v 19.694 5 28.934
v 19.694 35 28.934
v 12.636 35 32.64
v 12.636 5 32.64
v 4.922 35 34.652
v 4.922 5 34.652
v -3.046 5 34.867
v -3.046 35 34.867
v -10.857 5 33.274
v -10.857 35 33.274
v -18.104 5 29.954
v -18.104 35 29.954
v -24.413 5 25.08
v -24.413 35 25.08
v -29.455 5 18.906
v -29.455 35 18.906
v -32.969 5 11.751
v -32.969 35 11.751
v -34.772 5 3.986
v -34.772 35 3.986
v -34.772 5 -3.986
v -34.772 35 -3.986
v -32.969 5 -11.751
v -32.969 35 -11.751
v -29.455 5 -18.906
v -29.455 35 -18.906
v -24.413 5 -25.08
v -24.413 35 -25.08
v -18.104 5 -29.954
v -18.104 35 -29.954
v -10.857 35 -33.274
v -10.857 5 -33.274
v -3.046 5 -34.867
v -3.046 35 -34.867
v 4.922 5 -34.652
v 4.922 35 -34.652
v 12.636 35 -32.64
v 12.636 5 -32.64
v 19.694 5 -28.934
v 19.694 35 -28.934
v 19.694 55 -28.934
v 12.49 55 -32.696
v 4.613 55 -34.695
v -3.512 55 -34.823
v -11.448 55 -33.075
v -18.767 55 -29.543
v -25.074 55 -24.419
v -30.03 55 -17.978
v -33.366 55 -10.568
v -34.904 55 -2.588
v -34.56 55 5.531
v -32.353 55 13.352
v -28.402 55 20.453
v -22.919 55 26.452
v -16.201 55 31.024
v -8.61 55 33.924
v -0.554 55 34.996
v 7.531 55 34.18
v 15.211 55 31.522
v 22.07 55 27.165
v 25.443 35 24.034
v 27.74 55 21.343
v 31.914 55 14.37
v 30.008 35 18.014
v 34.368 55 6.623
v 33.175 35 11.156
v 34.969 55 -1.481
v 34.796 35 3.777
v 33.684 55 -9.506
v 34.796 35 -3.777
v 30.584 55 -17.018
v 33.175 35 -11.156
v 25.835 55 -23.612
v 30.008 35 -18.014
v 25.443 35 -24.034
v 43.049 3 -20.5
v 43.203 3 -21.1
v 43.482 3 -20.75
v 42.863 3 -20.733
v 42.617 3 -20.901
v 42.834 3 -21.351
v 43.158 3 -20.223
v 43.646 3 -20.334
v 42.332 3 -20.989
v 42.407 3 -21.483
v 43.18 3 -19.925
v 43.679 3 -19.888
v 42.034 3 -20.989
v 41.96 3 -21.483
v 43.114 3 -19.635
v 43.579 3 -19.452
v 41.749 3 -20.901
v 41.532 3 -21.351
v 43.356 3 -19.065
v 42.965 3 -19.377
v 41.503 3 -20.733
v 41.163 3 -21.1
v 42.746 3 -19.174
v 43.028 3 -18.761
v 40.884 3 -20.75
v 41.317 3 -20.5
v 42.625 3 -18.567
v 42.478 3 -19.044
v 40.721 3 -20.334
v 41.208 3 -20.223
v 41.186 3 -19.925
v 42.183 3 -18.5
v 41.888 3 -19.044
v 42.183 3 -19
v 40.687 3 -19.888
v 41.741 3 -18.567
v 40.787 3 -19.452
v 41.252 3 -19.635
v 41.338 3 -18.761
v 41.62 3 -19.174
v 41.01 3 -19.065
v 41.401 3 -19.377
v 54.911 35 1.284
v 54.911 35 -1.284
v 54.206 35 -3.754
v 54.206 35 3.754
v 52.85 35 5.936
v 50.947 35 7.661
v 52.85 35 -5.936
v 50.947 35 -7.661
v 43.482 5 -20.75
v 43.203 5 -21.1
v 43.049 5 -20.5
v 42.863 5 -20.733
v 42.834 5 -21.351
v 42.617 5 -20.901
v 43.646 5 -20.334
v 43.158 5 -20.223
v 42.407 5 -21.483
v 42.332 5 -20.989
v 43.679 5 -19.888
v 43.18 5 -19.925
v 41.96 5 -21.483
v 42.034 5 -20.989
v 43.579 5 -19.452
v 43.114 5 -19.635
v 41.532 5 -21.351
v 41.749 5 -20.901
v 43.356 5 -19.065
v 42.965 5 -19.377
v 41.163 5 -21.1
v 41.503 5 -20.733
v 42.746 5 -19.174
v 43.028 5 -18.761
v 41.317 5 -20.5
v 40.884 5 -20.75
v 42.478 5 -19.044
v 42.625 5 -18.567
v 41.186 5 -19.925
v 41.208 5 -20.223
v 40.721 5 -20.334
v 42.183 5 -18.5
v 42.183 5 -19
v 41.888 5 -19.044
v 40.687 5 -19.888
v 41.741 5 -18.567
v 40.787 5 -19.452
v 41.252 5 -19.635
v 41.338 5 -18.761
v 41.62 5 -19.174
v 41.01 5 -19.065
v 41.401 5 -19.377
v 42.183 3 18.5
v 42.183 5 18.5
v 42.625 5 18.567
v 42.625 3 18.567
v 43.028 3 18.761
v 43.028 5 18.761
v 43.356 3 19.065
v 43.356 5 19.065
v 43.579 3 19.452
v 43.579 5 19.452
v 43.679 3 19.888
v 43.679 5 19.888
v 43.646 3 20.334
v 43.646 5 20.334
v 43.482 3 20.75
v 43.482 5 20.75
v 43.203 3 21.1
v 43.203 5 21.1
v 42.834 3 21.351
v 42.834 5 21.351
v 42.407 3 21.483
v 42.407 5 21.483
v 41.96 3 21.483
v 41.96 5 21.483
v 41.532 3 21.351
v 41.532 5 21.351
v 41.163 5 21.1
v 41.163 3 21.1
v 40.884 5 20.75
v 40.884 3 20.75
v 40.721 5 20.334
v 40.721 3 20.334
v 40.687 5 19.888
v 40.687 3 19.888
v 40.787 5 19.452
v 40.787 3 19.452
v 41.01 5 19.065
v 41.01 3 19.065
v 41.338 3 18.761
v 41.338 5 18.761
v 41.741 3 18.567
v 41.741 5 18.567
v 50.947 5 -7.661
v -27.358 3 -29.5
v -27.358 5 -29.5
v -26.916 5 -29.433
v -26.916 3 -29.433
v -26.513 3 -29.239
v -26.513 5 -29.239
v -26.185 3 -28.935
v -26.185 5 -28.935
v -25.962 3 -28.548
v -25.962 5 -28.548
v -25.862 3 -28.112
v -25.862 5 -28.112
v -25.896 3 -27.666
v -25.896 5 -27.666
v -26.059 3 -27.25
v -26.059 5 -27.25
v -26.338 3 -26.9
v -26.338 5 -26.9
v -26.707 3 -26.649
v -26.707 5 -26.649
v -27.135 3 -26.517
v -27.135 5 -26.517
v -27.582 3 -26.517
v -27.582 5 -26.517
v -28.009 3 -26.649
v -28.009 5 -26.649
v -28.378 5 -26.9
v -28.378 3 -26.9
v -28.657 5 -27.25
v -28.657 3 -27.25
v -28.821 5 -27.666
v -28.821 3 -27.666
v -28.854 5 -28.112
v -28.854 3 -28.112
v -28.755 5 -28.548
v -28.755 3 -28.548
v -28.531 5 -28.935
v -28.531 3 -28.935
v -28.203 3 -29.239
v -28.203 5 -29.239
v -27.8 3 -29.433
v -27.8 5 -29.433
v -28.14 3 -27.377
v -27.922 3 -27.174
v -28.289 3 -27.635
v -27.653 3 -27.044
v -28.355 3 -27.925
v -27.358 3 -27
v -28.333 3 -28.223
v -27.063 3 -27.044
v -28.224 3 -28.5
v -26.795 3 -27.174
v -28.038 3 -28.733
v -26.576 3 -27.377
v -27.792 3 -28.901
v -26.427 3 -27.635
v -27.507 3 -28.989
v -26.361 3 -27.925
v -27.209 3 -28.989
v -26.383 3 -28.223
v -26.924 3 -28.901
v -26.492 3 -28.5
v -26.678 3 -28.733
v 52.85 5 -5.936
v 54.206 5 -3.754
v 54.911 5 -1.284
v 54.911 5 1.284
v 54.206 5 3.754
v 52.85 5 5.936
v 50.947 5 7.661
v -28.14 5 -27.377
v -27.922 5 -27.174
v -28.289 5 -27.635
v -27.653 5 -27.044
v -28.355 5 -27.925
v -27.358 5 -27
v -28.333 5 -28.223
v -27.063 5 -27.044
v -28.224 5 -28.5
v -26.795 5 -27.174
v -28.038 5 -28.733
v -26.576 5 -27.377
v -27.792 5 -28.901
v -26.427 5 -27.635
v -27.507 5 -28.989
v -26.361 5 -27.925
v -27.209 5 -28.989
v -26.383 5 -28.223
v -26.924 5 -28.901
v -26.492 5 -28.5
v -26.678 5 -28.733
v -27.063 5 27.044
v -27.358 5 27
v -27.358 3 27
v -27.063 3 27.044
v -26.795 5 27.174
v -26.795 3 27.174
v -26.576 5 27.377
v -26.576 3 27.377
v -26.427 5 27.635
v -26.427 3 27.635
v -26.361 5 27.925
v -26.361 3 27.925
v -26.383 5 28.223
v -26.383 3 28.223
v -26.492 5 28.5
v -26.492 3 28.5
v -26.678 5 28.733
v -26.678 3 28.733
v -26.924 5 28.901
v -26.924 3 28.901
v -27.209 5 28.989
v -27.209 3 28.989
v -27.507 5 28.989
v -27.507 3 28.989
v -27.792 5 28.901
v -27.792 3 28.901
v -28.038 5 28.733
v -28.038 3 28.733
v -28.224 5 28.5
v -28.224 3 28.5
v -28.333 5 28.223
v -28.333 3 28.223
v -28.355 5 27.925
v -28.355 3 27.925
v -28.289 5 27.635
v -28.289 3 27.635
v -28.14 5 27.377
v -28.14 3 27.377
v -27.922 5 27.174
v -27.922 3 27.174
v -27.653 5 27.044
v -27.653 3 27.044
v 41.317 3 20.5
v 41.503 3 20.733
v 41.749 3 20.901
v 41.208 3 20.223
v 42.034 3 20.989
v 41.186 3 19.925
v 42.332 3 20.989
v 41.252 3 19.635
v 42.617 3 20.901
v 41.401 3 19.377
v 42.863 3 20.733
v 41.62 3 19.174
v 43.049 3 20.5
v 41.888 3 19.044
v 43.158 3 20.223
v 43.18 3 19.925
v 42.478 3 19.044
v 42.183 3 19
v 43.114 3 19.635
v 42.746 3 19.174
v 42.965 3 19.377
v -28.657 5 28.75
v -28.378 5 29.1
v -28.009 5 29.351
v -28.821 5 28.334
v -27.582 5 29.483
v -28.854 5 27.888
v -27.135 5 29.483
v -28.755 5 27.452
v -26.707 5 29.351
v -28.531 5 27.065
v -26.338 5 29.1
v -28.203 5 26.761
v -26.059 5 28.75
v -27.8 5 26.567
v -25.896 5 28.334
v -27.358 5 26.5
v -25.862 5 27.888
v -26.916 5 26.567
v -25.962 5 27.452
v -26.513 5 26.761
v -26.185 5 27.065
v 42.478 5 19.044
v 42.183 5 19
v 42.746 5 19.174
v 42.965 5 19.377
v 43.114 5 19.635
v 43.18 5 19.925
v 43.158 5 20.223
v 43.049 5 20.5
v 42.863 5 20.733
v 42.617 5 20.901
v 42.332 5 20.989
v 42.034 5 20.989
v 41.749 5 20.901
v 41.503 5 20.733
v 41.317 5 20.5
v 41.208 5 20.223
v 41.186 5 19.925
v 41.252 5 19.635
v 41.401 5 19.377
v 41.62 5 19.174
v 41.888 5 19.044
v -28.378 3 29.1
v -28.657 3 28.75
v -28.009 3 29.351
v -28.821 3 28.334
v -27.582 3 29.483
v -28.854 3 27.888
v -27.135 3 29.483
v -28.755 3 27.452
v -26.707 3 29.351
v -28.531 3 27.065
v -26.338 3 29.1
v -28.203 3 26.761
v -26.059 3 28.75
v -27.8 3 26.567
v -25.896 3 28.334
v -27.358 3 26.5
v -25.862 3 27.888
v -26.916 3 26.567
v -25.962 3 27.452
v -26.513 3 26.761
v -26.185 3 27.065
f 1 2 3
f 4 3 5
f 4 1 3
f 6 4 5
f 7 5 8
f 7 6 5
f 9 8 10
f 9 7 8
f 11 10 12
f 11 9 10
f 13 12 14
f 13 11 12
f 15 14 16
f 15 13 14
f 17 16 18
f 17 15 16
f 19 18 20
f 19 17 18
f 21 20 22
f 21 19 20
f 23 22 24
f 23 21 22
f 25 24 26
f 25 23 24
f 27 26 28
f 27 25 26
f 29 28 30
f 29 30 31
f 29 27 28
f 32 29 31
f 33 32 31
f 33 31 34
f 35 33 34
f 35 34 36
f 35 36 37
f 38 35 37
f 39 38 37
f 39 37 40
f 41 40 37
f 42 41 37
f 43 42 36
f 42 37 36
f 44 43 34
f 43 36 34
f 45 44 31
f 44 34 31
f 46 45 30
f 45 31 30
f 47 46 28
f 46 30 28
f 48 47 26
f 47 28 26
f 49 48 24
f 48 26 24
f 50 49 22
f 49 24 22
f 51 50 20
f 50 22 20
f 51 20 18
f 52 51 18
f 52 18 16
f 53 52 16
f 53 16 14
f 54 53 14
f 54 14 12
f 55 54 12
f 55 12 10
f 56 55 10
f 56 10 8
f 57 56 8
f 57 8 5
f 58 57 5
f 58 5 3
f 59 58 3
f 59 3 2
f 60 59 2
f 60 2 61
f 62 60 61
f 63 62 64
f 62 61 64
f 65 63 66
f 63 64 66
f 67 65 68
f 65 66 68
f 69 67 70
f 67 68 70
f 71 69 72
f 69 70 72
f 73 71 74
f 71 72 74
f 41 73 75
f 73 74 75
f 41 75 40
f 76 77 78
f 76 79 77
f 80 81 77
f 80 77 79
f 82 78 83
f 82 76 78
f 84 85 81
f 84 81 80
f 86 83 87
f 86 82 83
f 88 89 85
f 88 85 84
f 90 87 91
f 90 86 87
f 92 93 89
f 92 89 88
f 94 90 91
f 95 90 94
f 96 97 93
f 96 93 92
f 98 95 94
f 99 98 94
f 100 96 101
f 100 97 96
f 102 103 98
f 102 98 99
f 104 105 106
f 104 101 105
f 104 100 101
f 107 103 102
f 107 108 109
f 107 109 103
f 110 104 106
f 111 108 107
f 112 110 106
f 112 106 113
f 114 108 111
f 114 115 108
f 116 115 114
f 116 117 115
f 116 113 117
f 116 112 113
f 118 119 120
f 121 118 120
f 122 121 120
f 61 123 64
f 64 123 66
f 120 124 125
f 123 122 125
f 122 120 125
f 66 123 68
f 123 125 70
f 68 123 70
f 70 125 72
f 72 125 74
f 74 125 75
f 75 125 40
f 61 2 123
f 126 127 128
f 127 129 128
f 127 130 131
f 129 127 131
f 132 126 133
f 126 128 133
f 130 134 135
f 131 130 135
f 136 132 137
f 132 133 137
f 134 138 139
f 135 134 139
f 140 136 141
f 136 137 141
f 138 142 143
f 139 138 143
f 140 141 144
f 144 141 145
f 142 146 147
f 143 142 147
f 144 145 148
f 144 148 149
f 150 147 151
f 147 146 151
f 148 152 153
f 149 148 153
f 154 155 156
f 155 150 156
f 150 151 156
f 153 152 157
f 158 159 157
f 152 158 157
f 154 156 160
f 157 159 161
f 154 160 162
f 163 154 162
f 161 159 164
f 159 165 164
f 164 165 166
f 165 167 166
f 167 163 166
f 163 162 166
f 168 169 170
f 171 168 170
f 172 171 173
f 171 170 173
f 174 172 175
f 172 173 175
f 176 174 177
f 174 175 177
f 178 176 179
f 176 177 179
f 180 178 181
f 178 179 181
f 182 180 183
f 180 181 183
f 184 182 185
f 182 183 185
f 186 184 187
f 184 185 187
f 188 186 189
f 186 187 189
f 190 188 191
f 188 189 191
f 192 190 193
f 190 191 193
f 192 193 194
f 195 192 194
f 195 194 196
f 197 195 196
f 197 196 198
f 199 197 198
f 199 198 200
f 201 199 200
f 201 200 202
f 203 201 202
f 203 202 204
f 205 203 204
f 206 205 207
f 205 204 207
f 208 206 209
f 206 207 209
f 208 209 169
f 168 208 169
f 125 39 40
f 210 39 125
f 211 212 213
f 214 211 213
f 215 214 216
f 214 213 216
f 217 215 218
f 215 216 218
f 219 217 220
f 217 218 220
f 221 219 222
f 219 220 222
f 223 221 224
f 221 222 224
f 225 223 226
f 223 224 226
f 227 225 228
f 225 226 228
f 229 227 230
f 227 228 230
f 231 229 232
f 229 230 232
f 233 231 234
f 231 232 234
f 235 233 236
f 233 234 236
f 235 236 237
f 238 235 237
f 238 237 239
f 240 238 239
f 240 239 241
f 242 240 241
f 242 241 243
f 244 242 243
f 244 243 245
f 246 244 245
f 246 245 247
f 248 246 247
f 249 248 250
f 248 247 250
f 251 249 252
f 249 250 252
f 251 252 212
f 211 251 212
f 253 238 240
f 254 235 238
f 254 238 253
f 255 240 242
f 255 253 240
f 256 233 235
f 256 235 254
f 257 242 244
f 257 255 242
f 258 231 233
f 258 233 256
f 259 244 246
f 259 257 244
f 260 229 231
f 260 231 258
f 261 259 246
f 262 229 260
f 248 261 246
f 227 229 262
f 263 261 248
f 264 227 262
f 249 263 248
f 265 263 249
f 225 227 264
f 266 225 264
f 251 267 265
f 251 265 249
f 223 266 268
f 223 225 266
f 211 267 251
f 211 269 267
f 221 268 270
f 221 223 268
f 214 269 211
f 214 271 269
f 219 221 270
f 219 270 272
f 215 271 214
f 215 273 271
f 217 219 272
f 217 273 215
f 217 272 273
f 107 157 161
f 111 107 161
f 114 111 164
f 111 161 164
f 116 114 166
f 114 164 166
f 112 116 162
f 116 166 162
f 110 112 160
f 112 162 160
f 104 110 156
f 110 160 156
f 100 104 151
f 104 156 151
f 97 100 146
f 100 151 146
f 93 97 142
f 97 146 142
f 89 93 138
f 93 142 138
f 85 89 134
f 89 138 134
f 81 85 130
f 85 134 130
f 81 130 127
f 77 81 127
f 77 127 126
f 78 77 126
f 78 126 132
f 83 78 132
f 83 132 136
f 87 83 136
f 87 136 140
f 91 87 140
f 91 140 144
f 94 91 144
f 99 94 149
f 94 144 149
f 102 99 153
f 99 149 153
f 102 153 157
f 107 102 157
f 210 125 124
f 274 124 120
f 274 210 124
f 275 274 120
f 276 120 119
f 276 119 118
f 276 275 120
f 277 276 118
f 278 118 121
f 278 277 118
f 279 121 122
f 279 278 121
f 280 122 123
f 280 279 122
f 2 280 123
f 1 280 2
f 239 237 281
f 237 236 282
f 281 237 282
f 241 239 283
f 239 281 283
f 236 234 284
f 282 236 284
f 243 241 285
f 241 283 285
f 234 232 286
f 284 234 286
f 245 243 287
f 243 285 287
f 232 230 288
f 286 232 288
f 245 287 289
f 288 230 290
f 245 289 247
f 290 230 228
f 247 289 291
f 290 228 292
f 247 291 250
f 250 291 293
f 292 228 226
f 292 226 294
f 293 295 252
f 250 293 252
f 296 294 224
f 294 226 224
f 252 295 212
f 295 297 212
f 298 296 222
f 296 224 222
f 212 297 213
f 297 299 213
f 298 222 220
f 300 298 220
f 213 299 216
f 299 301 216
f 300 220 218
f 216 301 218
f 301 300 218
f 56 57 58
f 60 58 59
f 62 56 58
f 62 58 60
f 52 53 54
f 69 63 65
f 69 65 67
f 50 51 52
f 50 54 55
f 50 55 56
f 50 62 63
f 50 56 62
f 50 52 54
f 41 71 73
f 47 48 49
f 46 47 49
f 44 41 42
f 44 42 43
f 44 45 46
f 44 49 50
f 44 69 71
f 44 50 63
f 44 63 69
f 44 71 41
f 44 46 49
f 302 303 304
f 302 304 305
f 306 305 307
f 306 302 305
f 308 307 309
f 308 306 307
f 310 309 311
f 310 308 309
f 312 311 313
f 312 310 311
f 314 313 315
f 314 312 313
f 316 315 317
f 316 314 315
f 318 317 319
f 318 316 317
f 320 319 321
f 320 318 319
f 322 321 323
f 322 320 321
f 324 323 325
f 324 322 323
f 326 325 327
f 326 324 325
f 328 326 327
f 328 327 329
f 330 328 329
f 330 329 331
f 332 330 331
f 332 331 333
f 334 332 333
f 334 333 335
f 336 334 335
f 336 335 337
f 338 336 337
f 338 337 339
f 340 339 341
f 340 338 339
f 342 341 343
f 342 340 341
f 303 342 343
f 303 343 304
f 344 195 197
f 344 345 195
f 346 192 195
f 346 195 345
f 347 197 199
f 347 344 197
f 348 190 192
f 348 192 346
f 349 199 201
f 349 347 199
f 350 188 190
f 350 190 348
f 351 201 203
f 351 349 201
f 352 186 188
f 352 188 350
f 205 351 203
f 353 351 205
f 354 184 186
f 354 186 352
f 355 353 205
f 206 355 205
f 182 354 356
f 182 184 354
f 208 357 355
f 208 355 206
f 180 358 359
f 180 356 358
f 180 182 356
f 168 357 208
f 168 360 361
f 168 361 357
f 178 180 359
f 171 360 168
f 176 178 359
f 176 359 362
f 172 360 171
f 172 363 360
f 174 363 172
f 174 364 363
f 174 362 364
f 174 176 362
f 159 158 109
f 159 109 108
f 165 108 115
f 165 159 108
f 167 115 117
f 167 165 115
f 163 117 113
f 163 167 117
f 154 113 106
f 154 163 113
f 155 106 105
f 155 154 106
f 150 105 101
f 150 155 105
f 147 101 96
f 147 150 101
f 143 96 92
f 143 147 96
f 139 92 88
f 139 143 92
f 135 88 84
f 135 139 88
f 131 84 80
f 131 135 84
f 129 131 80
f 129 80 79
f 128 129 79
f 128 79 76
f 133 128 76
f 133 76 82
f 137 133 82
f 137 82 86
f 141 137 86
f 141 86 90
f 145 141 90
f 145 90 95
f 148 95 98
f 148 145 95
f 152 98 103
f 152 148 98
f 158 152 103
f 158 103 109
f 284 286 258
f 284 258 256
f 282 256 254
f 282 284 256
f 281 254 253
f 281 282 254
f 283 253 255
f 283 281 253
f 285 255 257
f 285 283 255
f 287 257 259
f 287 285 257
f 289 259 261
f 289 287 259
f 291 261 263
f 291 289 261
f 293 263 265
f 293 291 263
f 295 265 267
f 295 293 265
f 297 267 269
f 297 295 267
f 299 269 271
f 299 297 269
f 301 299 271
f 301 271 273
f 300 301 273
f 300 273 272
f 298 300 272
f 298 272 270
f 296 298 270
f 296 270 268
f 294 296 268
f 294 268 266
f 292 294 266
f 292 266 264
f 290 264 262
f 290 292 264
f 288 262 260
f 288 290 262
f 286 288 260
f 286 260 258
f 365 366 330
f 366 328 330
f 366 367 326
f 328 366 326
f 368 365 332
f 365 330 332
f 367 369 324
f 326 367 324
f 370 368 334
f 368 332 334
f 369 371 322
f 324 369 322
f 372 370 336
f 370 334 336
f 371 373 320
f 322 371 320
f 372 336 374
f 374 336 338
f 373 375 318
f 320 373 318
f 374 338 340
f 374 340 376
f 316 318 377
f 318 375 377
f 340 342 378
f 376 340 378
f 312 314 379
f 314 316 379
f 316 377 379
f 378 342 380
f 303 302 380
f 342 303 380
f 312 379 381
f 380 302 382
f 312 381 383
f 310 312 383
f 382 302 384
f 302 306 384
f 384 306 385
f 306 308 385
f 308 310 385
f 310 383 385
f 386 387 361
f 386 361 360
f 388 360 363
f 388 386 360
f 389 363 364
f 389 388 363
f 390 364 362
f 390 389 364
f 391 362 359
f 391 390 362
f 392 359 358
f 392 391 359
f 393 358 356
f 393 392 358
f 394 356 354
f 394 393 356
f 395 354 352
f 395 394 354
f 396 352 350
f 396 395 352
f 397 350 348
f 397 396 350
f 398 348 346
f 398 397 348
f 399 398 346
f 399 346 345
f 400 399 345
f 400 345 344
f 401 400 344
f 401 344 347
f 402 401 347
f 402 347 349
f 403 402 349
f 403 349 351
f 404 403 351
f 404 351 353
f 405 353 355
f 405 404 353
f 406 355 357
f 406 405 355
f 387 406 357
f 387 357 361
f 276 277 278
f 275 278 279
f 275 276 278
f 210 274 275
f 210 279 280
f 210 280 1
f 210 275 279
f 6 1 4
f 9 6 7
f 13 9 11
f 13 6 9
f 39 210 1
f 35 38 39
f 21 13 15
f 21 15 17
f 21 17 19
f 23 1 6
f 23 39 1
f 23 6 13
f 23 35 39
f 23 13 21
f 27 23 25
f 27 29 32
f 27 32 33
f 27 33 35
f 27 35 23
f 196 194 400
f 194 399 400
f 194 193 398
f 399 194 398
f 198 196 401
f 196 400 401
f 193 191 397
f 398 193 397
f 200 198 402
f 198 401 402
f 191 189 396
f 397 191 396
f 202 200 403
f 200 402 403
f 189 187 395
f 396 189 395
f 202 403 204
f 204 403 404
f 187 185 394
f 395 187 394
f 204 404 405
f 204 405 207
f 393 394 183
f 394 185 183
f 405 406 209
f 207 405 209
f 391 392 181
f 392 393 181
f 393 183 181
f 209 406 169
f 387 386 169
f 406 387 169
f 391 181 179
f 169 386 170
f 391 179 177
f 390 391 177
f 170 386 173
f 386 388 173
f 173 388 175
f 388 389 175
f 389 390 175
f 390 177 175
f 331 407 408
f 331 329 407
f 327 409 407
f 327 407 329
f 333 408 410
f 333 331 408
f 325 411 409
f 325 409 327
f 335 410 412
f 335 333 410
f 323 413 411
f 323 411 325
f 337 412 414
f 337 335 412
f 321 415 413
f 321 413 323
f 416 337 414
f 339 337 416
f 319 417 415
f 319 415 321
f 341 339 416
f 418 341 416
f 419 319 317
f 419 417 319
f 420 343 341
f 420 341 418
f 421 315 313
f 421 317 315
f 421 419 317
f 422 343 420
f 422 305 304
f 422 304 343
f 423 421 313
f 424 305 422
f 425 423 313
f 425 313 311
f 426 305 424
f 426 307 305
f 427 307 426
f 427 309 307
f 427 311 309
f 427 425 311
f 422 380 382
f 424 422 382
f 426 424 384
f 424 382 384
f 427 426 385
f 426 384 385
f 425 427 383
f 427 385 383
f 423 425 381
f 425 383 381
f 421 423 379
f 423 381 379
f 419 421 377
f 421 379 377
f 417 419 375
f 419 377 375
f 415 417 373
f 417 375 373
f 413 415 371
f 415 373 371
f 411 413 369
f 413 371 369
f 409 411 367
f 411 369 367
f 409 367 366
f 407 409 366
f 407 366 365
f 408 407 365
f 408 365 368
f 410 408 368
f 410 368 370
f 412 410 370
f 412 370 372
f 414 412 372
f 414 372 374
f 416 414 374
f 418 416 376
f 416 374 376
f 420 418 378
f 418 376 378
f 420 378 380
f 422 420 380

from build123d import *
from build123d.topology import SkipClean

# Parameters (mm, degrees)
EXTRUDE_START     = 5
EXTRUDE_1_DEPTH   = 30
SKETCH_2_R        = 35
EXTRUDE_2_DEPTH   = 20
SKETCH_3_R        = 1.5
SKETCH_3_R_2      = 1
EXTRUDE_3_DEPTH   = 2
EXTRUDE_3_2_DEPTH = 2
EXTRUDE_3_3_DEPTH = 2
EXTRUDE_3_4_DEPTH = 2


with BuildPart() as part:
    # 草图1 → 凸台-拉伸1 (new body)
    with BuildSketch(Plane(origin=(0, 0, 0), x_dir=(1, 0, 0), z_dir=(0, 1, 0)).offset(EXTRUDE_START)):
        with BuildLine():
            Line((19.693574926, 28.933771041), (50.947046313, 7.661307814))
            ThreePointArc((50.947046313, 7.661307814), (55, 0), (50.947046313, -7.661307814))
            Line((50.947046313, -7.661307814), (19.693574926, -28.933771041))
            ThreePointArc((19.693574926, -28.933771041), (-35, 0), (19.693574926, 28.933771041))
        make_face()
    extrude(amount=EXTRUDE_1_DEPTH)

    # 草图2 → 凸台-拉伸2 (add)
    with SkipClean():  # the faces are left unmerged after this step: merging them gives an invalid solid
        with BuildSketch(Plane(origin=(0, 35, 0), x_dir=(1, 0, 0), z_dir=(0, 1, 0))):
            with Locations(Location((0, 0, 0), (0, 0, 55.759104726))):
                Circle(SKETCH_2_R)
        extrude(amount=EXTRUDE_2_DEPTH)


with BuildPart() as body_2:
    # 草图3 → 凸台-拉伸3 (new body)
    with BuildSketch(Plane.XZ.offset(-5)):
        with Locations(Location((42.183153241, 20, 0), (0, 0, 270))):
            Circle(SKETCH_3_R)
        with Locations(Location((42.183153241, 20, 0), (0, 0, 270))):
            Circle(SKETCH_3_R_2, mode=Mode.SUBTRACT)
    extrude(amount=EXTRUDE_3_DEPTH)


with BuildPart() as body_3:
    # 草图3 → Extrude 3 2 (new body)
    with BuildSketch(Plane.XZ.offset(-5)):
        with Locations(Location((-27.358201361, 28, 0), (0, 0, 270))):
            Circle(SKETCH_3_R)
        with Locations(Location((-27.358201361, 28, 0), (0, 0, 270))):
            Circle(SKETCH_3_R_2, mode=Mode.SUBTRACT)
    extrude(amount=EXTRUDE_3_2_DEPTH)


with BuildPart() as body_4:
    # 草图3 → Extrude 3 3 (new body)
    with BuildSketch(Plane.XZ.offset(-5)):
        with Locations(Location((42.183153241, -20, 0), (0, 0, 90))):
            Circle(SKETCH_3_R)
        with Locations(Location((42.183153241, -20, 0), (0, 0, 90))):
            Circle(SKETCH_3_R_2, mode=Mode.SUBTRACT)
    extrude(amount=EXTRUDE_3_3_DEPTH)


with BuildPart() as body_5:
    # 草图3 → Extrude 3 4 (new body)
    with BuildSketch(Plane.XZ.offset(-5)):
        with Locations(Location((-27.358201361, -28, 0), (0, 0, 270))):
            Circle(SKETCH_3_R)
        with Locations(Location((-27.358201361, -28, 0), (0, 0, 90))):
            Circle(SKETCH_3_R_2, mode=Mode.SUBTRACT)
    extrude(amount=EXTRUDE_3_4_DEPTH)


solid = Compound([part.part, body_2.part, body_3.part, body_4.part, body_5.part])
